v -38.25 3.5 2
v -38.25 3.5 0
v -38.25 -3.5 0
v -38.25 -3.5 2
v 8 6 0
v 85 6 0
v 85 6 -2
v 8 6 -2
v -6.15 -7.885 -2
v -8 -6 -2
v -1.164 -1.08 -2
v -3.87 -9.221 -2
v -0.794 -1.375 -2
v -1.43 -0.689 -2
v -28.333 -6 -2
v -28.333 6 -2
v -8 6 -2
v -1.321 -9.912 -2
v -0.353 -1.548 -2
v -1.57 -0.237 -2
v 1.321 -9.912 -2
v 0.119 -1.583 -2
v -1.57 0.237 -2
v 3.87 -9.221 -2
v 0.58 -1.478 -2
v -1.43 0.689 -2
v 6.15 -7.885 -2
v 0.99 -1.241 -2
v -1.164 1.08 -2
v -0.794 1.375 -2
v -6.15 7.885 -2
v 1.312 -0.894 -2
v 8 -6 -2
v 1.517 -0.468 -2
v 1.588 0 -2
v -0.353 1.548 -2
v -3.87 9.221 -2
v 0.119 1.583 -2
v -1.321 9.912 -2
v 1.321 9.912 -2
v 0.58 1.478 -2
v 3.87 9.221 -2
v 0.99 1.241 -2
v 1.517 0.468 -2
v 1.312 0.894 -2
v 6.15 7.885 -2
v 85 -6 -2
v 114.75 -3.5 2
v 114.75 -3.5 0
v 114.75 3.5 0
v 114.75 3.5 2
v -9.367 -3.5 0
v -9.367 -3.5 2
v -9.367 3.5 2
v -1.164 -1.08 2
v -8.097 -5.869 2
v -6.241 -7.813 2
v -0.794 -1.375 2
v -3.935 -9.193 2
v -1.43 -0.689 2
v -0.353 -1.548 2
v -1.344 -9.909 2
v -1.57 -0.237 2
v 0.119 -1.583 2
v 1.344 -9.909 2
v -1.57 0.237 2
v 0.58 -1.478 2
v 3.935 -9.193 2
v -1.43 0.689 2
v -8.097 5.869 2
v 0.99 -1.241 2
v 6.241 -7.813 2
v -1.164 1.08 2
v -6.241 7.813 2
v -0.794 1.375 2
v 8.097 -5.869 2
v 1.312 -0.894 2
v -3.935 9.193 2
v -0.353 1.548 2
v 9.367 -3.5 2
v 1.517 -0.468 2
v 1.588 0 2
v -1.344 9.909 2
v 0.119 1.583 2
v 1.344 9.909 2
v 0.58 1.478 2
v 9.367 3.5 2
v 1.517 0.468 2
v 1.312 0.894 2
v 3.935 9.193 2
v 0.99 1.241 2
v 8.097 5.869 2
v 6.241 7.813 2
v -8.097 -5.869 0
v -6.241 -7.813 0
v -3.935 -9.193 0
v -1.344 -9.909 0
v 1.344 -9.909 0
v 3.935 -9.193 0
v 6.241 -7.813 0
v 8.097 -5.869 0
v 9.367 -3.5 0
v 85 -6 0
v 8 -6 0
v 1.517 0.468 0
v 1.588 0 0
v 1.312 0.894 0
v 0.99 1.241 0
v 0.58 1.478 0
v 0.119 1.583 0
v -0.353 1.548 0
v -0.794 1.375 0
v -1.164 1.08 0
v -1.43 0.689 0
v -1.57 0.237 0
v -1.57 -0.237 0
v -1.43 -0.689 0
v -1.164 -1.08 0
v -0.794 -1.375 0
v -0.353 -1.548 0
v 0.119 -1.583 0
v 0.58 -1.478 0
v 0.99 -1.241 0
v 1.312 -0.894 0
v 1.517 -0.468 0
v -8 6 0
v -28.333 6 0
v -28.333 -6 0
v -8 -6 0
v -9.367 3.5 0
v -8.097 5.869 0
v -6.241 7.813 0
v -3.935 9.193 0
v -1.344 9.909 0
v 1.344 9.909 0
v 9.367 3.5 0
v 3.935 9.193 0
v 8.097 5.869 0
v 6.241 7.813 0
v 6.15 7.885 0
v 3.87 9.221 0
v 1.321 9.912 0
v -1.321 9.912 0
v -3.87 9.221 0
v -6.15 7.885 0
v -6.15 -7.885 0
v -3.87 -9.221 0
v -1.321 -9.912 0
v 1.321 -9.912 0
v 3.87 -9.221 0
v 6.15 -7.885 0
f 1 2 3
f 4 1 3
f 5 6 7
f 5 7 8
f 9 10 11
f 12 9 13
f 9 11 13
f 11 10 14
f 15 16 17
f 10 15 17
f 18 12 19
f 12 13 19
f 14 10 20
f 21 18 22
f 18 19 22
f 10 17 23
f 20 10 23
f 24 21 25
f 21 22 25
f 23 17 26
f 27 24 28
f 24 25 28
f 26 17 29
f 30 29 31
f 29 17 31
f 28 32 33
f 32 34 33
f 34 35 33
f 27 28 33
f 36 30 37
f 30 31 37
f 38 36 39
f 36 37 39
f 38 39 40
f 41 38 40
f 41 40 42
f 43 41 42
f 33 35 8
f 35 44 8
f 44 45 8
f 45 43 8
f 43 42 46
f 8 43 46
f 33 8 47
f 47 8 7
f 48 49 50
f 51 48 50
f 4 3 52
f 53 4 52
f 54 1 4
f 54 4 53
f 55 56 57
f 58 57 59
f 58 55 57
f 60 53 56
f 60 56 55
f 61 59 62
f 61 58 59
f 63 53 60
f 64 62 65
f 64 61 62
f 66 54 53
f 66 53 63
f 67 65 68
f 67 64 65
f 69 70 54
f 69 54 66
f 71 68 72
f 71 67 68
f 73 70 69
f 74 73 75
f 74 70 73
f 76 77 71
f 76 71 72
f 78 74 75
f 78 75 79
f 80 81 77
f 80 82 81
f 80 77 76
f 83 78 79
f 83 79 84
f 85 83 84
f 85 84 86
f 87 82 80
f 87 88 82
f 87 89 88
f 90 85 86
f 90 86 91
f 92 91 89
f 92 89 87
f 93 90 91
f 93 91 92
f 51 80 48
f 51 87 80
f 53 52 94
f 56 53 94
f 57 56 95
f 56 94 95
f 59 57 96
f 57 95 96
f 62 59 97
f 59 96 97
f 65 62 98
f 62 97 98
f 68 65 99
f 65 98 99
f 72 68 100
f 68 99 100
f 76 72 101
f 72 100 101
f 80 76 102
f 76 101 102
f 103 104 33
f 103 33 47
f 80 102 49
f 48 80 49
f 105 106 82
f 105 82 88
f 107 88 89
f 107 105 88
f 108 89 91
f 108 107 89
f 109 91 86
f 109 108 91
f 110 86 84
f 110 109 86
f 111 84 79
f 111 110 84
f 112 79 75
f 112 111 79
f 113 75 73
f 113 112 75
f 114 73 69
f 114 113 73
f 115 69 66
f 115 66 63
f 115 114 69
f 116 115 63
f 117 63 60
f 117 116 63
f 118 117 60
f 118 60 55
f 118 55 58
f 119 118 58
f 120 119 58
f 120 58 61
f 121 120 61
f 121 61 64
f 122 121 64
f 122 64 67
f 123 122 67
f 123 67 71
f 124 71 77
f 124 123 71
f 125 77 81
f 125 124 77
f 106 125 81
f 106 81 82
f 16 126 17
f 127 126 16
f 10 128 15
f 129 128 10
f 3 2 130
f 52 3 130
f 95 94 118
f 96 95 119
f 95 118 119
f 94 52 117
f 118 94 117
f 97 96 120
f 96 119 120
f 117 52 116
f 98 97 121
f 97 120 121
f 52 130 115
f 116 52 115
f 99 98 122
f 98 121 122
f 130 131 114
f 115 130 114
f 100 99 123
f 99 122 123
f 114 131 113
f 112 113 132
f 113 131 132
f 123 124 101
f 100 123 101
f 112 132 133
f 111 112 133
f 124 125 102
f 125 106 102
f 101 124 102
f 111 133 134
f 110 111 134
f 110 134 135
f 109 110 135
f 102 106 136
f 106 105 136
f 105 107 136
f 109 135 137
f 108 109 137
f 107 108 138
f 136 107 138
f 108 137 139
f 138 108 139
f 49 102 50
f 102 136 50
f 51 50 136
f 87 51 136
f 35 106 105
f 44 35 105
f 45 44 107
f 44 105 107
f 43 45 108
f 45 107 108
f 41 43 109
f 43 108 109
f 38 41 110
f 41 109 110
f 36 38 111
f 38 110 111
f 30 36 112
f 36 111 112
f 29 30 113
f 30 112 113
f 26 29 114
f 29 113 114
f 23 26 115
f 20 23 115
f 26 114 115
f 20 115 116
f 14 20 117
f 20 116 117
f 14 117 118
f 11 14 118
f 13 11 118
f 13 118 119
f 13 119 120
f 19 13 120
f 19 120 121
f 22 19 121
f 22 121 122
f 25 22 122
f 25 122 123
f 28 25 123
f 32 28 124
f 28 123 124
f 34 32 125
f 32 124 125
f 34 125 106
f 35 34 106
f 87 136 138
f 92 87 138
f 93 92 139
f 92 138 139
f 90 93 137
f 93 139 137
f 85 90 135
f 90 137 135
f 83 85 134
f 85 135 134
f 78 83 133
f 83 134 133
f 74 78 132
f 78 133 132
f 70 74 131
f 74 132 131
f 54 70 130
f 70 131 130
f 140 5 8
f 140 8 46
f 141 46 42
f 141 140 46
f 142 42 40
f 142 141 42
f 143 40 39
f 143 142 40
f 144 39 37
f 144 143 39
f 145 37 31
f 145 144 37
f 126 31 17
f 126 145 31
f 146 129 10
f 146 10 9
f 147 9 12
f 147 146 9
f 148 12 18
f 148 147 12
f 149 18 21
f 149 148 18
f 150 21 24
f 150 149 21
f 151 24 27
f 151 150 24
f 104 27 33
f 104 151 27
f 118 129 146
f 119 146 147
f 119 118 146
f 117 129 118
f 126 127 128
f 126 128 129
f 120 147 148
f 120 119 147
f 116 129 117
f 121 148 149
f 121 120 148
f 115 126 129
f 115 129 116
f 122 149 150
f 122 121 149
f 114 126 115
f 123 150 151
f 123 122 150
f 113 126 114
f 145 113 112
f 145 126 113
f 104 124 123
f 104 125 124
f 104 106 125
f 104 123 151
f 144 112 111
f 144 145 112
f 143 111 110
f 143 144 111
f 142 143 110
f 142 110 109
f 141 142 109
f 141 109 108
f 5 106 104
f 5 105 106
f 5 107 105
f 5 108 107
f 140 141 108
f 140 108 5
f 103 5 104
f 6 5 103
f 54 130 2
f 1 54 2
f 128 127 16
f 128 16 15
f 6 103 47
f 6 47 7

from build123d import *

# Parameters (mm, degrees)
F0_R     = 1.5875
F1_DEPTH = 2
F2_R     = 1.5875
F3_DEPTH = 2


with BuildPart() as f1:
    # F0 (on Top) → F1 (new body)
    with BuildSketch(Plane.XY):
        with BuildLine():
            Line((-9.3674969976, 3.5), (-38.25, 3.5))
            Line((-38.25, 3.5), (-38.25, -3.5))
            Line((-38.25, -3.5), (-9.3674969976, -3.5))
            ThreePointArc((-9.3674969976, -3.5), (-10, 0), (-9.3674969976, 3.5))
        make_face()
        with BuildLine():
            ThreePointArc((9.3674969976, 3.5), (0, 10), (-9.3674969976, 3.5))
            Line((-9.3674969976, 3.5), (9.3674969976, 3.5))
        make_face()
        with BuildLine():
            Line((9.3674969976, 3.5), (-9.3674969976, 3.5))
            ThreePointArc((-9.3674969976, 3.5), (-10, 0), (-9.3674969976, -3.5))
            Line((-9.3674969976, -3.5), (9.3674969976, -3.5))
            ThreePointArc((9.3674969976, -3.5), (9.8406038935, -1.7783461452), (10, 0))
            ThreePointArc((10, 0), (9.8406038935, 1.7783461452), (9.3674969976, 3.5))
        make_face()
        Circle(F0_R, mode=Mode.SUBTRACT)
        with BuildLine():
            Line((114.75, 3.5), (9.3674969976, 3.5))
            ThreePointArc((9.3674969976, 3.5), (9.8406038935, 1.7783461452), (10, 0))
            ThreePointArc((10, 0), (9.8406038935, -1.7783461452), (9.3674969976, -3.5))
            Line((9.3674969976, -3.5), (114.75, -3.5))
            Line((114.75, -3.5), (114.75, 3.5))
        make_face()
        with BuildLine():
            Line((9.3674969976, -3.5), (-9.3674969976, -3.5))
            ThreePointArc((-9.3674969976, -3.5), (0, -10), (9.3674969976, -3.5))
        make_face()
    extrude(amount=F1_DEPTH)


with BuildPart() as f3:
    # F2 (on Top) → F3 (new body)
    with BuildSketch(Plane.XY):
        with BuildLine():
            Line((-8, 6), (-28.3333333333, 6))
            Line((-28.3333333333, 6), (-28.3333333333, -6))
            Line((-28.3333333333, -6), (-8, -6))
            ThreePointArc((-8, -6), (-10, 0), (-8, 6))
        make_face()
        with BuildLine():
            ThreePointArc((8, 6), (0, 10), (-8, 6))
            Line((-8, 6), (8, 6))
        make_face()
        with BuildLine():
            Line((8, 6), (-8, 6))
            ThreePointArc((-8, 6), (-10, 0), (-8, -6))
            Line((-8, -6), (8, -6))
            ThreePointArc((8, -6), (9.4868329805, -3.1622776602), (10, 0))
            ThreePointArc((10, 0), (9.4868329805, 3.1622776602), (8, 6))
        make_face()
        Circle(F2_R, mode=Mode.SUBTRACT)
        with BuildLine():
            Line((85, 6), (8, 6))
            ThreePointArc((8, 6), (9.4868329805, 3.1622776602), (10, 0))
            ThreePointArc((10, 0), (9.4868329805, -3.1622776602), (8, -6))
            Line((8, -6), (85, -6))
            Line((85, -6), (85, 6))
        make_face()
        with BuildLine():
            Line((8, -6), (-8, -6))
            ThreePointArc((-8, -6), (0, -10), (8, -6))
        make_face()
    extrude(amount=-F3_DEPTH)


solid = Compound([f1.part, f3.part])
